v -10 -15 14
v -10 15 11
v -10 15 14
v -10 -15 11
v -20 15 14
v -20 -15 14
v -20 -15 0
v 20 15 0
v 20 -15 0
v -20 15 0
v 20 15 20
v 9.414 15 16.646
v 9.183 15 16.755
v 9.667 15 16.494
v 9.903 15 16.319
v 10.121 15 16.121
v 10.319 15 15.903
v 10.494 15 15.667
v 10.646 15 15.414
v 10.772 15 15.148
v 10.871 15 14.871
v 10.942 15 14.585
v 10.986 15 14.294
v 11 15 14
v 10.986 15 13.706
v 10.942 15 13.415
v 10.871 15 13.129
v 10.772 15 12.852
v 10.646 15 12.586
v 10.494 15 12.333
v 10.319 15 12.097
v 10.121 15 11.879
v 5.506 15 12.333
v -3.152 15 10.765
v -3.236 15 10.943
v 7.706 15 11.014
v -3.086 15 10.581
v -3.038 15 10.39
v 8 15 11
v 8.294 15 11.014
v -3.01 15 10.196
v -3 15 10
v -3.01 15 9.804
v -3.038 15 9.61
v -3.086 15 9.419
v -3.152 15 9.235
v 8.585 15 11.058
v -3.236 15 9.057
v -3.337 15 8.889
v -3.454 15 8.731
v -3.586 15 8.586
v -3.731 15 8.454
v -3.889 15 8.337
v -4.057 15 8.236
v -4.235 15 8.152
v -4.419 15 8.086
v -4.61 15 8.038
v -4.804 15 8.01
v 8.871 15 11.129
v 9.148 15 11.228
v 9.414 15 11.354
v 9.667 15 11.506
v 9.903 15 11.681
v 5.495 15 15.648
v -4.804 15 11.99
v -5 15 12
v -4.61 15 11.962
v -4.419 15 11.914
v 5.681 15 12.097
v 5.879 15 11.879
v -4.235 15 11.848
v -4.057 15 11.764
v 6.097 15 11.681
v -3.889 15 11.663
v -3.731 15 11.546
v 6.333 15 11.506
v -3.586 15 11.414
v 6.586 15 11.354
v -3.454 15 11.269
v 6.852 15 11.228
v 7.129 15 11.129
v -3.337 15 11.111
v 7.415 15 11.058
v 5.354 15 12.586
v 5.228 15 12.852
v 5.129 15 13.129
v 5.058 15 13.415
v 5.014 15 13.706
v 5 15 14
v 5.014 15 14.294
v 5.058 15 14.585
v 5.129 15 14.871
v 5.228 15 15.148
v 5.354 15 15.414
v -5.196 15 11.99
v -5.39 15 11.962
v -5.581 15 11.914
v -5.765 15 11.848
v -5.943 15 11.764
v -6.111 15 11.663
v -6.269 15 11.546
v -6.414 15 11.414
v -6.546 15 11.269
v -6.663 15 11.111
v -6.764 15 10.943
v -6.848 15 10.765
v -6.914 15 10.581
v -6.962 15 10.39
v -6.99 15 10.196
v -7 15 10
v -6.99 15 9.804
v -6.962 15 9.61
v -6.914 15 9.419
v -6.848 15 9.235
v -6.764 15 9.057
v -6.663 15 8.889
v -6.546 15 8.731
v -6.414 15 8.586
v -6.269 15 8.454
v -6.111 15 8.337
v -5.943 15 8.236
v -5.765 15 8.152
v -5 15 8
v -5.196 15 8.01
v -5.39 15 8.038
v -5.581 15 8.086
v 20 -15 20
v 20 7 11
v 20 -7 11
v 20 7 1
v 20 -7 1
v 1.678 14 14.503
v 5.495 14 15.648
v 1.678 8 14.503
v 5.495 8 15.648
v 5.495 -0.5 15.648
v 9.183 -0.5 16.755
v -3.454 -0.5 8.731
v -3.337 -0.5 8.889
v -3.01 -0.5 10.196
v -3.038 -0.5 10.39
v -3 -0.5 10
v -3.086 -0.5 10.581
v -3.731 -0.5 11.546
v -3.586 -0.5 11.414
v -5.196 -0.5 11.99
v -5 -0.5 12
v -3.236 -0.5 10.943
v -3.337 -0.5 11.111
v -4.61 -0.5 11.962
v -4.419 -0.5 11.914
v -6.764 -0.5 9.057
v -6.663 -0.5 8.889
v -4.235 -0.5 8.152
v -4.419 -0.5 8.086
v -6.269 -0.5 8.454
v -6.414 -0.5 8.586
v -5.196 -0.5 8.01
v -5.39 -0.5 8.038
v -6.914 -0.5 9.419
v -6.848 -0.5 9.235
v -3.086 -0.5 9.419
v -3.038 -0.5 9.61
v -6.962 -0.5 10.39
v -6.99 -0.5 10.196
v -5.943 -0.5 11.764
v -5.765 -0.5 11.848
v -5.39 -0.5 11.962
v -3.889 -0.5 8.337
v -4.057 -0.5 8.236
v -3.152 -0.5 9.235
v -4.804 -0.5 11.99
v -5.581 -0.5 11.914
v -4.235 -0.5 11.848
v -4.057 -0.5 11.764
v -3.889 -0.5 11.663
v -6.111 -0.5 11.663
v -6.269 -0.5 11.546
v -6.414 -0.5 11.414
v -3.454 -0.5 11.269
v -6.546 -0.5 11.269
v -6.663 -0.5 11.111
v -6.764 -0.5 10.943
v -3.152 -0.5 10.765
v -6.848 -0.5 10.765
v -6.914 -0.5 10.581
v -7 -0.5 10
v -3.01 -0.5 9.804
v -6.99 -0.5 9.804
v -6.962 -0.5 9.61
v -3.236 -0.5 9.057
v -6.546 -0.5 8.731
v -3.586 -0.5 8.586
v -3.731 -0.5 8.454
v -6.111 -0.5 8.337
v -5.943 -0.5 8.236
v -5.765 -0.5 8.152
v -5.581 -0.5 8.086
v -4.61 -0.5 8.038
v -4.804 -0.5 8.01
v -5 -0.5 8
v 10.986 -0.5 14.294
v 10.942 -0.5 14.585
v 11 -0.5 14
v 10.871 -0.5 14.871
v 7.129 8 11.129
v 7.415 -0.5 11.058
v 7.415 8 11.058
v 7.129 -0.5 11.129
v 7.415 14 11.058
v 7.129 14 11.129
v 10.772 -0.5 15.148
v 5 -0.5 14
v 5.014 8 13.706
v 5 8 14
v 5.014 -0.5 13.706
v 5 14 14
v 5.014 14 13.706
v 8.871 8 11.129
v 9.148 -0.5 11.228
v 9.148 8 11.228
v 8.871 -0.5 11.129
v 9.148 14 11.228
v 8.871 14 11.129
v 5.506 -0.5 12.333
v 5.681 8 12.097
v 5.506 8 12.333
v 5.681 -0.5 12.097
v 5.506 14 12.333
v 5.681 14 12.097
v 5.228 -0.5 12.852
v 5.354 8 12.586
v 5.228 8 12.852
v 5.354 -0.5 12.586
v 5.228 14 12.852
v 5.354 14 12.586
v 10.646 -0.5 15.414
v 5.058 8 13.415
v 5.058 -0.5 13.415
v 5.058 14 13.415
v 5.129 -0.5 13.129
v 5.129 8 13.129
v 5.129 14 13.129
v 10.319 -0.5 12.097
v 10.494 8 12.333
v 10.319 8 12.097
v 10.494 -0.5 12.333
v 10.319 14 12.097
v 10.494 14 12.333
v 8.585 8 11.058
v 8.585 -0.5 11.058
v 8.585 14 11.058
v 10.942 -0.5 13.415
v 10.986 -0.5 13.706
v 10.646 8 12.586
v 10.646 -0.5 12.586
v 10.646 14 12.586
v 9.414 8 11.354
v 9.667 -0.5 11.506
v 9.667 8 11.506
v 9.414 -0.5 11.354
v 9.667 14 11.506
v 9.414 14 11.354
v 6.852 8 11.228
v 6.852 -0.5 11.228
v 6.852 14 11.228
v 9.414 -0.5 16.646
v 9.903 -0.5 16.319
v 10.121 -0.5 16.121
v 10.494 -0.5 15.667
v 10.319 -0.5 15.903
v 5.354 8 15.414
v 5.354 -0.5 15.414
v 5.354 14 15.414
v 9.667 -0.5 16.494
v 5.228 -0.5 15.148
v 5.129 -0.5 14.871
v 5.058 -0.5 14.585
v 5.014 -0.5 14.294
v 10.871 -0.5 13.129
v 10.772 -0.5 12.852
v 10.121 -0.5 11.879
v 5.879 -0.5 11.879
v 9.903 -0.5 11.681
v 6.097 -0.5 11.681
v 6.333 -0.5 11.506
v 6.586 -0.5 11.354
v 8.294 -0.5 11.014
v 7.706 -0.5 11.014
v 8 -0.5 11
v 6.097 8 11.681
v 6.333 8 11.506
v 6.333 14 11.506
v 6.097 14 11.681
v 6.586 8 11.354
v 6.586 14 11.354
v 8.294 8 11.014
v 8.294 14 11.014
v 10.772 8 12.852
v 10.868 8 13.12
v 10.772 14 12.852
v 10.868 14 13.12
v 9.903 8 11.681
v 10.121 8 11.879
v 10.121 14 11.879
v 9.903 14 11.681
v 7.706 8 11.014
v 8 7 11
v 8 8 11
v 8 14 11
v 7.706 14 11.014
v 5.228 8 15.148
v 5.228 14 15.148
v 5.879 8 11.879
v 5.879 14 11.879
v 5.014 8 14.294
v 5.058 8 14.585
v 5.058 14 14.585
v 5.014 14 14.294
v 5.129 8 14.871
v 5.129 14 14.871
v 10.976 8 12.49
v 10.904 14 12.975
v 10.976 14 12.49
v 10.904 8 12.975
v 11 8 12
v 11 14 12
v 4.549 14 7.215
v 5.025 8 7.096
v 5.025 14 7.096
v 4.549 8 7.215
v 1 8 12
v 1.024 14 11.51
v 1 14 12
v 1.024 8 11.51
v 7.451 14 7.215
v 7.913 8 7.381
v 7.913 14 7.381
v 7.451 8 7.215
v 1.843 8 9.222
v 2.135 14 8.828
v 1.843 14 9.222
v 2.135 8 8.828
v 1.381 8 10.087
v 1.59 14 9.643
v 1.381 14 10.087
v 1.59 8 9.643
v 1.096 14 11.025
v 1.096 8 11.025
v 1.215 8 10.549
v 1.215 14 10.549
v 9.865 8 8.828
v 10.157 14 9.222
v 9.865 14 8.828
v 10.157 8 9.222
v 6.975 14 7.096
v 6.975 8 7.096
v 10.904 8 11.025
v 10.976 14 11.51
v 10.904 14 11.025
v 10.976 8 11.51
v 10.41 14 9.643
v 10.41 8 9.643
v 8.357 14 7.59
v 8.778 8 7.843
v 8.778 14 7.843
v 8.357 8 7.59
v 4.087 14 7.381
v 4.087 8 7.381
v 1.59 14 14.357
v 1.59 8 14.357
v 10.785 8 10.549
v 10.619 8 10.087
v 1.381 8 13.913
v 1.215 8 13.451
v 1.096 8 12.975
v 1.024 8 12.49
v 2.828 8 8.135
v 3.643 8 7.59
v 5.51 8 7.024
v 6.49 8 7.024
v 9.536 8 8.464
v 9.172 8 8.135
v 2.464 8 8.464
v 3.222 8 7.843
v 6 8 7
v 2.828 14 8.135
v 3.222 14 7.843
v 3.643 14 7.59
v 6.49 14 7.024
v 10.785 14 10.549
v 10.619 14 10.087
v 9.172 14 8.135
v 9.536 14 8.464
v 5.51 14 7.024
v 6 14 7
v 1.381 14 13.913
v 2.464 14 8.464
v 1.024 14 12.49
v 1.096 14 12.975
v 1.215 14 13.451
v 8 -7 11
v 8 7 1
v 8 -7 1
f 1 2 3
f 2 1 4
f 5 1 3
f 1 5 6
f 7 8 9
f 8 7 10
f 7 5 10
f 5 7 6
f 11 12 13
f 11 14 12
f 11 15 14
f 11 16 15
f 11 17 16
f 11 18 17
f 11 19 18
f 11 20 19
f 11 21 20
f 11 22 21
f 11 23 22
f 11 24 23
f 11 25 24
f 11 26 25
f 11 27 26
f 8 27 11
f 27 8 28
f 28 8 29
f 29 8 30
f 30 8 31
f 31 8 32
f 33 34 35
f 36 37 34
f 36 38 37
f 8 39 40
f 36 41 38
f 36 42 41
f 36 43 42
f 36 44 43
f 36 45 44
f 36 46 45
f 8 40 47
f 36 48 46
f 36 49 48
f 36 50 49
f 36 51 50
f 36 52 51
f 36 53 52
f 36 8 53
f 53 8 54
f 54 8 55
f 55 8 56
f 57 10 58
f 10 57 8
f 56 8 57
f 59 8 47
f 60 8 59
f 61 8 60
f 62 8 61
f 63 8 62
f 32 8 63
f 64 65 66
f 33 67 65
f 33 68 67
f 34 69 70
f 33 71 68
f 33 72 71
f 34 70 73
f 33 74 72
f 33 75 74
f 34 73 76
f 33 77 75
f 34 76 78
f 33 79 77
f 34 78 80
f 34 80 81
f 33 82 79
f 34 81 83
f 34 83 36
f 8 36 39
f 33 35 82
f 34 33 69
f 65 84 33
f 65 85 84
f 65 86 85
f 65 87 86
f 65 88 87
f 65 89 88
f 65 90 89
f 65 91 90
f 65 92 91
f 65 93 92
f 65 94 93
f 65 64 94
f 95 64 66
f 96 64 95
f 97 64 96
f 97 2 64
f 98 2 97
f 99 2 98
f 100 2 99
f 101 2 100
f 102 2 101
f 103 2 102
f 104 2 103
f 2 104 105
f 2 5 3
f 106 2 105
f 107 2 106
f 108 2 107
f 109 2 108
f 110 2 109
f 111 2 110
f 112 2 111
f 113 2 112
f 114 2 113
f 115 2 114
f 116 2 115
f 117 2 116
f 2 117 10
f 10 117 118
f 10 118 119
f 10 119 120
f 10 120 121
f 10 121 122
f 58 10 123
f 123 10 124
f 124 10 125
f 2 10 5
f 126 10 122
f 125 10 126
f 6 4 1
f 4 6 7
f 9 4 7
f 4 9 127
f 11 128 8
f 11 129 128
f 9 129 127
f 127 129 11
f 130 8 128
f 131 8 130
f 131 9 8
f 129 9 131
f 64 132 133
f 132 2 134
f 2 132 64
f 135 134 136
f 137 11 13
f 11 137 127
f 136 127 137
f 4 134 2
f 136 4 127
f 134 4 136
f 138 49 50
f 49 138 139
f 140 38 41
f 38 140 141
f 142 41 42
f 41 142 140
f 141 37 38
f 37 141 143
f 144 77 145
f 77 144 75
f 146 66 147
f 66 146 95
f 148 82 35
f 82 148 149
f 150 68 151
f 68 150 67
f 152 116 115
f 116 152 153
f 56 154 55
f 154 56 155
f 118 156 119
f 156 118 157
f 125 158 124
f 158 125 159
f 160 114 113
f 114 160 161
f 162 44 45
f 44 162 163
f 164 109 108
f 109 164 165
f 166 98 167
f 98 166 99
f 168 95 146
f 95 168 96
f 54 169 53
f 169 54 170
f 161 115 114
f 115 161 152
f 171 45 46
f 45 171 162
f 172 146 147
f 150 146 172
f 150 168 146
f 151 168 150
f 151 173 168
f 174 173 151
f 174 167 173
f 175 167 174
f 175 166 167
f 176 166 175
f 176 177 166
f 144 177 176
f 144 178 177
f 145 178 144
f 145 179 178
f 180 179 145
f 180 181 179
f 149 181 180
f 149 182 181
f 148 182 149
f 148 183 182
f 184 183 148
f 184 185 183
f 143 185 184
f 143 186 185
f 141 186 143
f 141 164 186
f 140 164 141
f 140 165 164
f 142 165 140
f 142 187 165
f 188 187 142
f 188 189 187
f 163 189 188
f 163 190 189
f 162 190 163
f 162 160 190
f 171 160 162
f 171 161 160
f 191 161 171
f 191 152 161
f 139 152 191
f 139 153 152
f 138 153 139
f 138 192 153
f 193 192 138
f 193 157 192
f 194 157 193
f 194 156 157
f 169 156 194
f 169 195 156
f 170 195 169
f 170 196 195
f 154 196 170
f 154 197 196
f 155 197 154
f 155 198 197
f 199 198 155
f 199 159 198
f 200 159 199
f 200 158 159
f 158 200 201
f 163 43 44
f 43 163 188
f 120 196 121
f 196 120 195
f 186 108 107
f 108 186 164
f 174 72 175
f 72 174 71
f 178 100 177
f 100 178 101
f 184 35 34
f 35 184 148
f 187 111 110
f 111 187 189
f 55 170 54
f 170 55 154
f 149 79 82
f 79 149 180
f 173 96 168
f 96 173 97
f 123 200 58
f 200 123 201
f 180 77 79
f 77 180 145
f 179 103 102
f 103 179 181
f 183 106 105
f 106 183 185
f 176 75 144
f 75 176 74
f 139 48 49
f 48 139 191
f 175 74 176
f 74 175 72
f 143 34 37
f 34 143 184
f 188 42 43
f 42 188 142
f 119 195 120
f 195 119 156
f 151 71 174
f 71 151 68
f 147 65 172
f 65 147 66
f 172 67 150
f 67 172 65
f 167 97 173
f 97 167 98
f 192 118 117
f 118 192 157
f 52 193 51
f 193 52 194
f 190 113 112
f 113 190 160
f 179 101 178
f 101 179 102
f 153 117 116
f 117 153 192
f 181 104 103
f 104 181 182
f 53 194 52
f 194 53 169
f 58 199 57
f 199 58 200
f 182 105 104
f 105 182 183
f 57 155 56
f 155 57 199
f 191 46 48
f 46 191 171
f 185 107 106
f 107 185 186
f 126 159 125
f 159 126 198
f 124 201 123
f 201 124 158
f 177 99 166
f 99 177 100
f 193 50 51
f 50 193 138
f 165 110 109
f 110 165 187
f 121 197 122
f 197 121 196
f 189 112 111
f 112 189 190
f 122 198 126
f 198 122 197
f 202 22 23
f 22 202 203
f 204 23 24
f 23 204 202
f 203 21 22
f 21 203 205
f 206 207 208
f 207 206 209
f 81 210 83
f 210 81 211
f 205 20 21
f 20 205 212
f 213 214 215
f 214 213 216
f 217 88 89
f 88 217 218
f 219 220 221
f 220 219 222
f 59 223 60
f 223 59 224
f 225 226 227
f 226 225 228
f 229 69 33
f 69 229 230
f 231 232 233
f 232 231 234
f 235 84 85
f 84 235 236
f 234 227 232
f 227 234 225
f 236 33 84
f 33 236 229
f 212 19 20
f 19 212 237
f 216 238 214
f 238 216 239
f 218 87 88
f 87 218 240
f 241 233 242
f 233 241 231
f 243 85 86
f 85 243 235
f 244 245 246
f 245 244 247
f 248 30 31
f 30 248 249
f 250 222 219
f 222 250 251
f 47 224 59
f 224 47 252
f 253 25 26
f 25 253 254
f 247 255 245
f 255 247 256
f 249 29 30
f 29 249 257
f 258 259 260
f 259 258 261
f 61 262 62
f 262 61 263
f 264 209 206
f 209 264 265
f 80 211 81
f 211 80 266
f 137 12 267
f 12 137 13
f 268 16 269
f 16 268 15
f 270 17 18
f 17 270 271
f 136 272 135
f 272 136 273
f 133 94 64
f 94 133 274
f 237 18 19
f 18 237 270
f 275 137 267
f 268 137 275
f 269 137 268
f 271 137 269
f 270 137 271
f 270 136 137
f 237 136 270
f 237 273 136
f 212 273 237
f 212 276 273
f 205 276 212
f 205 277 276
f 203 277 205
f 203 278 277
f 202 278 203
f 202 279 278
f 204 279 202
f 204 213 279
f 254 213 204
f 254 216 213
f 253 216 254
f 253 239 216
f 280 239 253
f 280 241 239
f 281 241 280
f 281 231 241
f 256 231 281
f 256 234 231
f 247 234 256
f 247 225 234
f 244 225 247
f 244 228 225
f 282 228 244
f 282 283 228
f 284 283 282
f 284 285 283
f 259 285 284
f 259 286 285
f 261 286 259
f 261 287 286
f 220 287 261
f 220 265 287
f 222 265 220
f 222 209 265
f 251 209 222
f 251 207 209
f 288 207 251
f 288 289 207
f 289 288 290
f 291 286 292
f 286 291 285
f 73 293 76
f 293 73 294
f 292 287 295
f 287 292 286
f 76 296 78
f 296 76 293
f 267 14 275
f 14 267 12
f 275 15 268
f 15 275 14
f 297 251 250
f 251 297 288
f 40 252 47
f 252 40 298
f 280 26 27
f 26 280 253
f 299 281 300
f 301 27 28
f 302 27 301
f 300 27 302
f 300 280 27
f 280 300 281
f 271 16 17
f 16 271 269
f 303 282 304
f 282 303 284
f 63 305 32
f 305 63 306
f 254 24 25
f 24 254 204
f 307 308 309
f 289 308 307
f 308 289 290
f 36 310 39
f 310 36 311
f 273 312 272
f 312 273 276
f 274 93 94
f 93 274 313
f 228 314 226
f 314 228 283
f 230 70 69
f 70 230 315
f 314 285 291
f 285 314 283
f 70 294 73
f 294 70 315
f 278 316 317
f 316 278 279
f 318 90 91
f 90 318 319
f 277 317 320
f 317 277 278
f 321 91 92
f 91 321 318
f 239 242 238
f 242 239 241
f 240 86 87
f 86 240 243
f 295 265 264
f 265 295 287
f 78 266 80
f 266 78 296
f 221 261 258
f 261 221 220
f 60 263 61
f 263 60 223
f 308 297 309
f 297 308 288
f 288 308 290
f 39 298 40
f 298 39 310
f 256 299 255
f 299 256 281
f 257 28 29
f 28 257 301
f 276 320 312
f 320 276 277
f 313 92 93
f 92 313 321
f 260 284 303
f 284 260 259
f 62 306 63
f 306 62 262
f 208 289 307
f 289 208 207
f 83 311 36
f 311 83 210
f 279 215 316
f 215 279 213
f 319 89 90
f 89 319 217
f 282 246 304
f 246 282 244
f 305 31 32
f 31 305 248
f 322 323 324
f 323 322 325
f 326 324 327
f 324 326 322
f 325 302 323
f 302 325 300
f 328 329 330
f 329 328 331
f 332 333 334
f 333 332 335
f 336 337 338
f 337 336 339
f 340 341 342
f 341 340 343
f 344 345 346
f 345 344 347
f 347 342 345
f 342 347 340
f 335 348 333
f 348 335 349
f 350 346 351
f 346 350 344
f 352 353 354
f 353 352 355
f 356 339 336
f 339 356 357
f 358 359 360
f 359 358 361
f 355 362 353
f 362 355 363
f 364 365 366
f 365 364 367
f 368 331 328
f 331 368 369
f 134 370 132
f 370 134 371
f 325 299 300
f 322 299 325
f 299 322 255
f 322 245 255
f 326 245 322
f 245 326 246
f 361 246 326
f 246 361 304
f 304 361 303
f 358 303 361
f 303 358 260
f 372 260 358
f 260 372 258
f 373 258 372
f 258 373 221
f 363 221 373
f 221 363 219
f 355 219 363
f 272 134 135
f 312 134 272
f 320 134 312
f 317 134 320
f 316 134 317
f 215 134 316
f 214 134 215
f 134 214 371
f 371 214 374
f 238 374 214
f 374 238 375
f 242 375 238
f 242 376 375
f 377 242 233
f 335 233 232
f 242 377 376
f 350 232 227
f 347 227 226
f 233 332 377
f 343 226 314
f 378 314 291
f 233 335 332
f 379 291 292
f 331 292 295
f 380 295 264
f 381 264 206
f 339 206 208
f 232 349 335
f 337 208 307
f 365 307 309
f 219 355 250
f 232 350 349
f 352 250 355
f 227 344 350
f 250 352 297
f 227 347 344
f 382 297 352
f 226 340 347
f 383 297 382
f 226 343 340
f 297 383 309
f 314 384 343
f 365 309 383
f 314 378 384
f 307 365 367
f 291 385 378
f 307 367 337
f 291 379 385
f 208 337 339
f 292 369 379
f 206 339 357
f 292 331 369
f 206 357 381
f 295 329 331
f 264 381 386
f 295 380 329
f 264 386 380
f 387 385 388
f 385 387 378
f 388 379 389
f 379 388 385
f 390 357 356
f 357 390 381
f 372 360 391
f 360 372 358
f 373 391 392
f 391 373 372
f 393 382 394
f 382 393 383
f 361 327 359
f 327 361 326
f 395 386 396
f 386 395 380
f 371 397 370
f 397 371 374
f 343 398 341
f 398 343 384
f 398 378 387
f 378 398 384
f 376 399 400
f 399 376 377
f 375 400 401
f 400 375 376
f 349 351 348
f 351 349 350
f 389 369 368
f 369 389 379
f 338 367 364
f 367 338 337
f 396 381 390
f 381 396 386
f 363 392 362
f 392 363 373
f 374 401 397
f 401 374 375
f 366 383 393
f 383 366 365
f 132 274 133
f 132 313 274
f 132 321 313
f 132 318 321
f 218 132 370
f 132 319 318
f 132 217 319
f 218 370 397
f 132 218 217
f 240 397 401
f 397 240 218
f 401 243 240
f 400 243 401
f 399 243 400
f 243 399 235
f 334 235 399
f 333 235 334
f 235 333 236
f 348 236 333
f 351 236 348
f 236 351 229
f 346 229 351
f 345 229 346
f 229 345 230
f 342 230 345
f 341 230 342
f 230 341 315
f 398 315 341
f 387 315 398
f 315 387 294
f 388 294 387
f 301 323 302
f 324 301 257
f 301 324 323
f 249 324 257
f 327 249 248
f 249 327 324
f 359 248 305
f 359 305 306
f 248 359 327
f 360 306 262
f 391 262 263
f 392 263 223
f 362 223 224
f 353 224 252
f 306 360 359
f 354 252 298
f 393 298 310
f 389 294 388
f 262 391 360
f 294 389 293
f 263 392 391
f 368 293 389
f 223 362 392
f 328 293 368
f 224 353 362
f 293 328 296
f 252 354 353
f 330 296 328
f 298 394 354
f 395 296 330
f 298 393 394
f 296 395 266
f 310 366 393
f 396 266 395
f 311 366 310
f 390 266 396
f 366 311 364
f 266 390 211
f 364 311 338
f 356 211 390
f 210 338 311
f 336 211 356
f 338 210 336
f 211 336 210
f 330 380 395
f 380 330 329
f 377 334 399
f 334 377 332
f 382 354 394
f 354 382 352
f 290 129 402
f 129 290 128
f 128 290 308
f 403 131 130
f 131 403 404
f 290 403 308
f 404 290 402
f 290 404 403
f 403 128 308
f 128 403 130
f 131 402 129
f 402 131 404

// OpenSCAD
$fn=64;

eps = 0.01;

// Fallback minimal printable size since given bounding box is effectively zero
L = 40;
W = 30;
H = 20;

// Wedge parameters
h_low = 8;
h_high = 20;

// Flange/step and foot
flange_len = 10;
flange_extra_h = 6;
foot_len = 8;
foot_h = 4;
foot_w = 18;

// Holes on sloped/side region
hole_d = 4;
hole2_d = 6;
hole_depth = W + 2;

module wedge_body(len=L, wid=W, h1=h_low, h2=h_high) {
    polyhedron(
        points=[
            [-len/2, -wid/2, 0],
            [ len/2, -wid/2, 0],
            [ len/2,  wid/2, 0],
            [-len/2,  wid/2, 0],
            [-len/2, -wid/2, h1],
            [ len/2, -wid/2, h2],
            [ len/2,  wid/2, h2],
            [-len/2,  wid/2, h1]
        ],
        faces=[
            [0,1,2,3],
            [4,7,6,5],
            [0,4,5,1],
            [1,5,6,2],
            [2,6,7,3],
            [3,7,4,0]
        ]
    );
}

module flange_and_foot() {
    union() {
        // Vertical flange/step at one end (x = -L/2 side)
        translate([-L/2 + flange_len/2, 0, (h_low + flange_extra_h)/2])
            cube([flange_len, W, h_low + flange_extra_h], center=true);

        // Small lower protruding foot near same end
        translate([-L/2 + foot_len/2, 0, foot_h/2])
            cube([foot_len, foot_w, foot_h], center=true);
    }
}

module side_holes() {
    // Two holes entering from +Y side into the body, positioned along length and height
    for (p = [
        [-5, 0, 10, hole_d],
        [ 8, 0, 14, hole2_d]
    ]) {
        translate([p[0], W/2 + 0.5, p[2]])
            rotate([90,0,0])
                cylinder(d=p[3], h=hole_depth, center=true);
    }
}

module bracket() {
    difference() {
        union() {
            wedge_body();
            flange_and_foot();
        }
        side_holes();

        // Small recessed pocket on sloped/side region
        translate([6, W/2 - 4, 12])
            rotate([90,0,0])
                cylinder(d=10, h=6, center=true);

        // Clearance notch near broad flat face end (x = +L/2)
        translate([L/2 - 6, 0, 6])
            cube([12, 14, 10], center=true);
    }
}

// Center at origin
bracket();
